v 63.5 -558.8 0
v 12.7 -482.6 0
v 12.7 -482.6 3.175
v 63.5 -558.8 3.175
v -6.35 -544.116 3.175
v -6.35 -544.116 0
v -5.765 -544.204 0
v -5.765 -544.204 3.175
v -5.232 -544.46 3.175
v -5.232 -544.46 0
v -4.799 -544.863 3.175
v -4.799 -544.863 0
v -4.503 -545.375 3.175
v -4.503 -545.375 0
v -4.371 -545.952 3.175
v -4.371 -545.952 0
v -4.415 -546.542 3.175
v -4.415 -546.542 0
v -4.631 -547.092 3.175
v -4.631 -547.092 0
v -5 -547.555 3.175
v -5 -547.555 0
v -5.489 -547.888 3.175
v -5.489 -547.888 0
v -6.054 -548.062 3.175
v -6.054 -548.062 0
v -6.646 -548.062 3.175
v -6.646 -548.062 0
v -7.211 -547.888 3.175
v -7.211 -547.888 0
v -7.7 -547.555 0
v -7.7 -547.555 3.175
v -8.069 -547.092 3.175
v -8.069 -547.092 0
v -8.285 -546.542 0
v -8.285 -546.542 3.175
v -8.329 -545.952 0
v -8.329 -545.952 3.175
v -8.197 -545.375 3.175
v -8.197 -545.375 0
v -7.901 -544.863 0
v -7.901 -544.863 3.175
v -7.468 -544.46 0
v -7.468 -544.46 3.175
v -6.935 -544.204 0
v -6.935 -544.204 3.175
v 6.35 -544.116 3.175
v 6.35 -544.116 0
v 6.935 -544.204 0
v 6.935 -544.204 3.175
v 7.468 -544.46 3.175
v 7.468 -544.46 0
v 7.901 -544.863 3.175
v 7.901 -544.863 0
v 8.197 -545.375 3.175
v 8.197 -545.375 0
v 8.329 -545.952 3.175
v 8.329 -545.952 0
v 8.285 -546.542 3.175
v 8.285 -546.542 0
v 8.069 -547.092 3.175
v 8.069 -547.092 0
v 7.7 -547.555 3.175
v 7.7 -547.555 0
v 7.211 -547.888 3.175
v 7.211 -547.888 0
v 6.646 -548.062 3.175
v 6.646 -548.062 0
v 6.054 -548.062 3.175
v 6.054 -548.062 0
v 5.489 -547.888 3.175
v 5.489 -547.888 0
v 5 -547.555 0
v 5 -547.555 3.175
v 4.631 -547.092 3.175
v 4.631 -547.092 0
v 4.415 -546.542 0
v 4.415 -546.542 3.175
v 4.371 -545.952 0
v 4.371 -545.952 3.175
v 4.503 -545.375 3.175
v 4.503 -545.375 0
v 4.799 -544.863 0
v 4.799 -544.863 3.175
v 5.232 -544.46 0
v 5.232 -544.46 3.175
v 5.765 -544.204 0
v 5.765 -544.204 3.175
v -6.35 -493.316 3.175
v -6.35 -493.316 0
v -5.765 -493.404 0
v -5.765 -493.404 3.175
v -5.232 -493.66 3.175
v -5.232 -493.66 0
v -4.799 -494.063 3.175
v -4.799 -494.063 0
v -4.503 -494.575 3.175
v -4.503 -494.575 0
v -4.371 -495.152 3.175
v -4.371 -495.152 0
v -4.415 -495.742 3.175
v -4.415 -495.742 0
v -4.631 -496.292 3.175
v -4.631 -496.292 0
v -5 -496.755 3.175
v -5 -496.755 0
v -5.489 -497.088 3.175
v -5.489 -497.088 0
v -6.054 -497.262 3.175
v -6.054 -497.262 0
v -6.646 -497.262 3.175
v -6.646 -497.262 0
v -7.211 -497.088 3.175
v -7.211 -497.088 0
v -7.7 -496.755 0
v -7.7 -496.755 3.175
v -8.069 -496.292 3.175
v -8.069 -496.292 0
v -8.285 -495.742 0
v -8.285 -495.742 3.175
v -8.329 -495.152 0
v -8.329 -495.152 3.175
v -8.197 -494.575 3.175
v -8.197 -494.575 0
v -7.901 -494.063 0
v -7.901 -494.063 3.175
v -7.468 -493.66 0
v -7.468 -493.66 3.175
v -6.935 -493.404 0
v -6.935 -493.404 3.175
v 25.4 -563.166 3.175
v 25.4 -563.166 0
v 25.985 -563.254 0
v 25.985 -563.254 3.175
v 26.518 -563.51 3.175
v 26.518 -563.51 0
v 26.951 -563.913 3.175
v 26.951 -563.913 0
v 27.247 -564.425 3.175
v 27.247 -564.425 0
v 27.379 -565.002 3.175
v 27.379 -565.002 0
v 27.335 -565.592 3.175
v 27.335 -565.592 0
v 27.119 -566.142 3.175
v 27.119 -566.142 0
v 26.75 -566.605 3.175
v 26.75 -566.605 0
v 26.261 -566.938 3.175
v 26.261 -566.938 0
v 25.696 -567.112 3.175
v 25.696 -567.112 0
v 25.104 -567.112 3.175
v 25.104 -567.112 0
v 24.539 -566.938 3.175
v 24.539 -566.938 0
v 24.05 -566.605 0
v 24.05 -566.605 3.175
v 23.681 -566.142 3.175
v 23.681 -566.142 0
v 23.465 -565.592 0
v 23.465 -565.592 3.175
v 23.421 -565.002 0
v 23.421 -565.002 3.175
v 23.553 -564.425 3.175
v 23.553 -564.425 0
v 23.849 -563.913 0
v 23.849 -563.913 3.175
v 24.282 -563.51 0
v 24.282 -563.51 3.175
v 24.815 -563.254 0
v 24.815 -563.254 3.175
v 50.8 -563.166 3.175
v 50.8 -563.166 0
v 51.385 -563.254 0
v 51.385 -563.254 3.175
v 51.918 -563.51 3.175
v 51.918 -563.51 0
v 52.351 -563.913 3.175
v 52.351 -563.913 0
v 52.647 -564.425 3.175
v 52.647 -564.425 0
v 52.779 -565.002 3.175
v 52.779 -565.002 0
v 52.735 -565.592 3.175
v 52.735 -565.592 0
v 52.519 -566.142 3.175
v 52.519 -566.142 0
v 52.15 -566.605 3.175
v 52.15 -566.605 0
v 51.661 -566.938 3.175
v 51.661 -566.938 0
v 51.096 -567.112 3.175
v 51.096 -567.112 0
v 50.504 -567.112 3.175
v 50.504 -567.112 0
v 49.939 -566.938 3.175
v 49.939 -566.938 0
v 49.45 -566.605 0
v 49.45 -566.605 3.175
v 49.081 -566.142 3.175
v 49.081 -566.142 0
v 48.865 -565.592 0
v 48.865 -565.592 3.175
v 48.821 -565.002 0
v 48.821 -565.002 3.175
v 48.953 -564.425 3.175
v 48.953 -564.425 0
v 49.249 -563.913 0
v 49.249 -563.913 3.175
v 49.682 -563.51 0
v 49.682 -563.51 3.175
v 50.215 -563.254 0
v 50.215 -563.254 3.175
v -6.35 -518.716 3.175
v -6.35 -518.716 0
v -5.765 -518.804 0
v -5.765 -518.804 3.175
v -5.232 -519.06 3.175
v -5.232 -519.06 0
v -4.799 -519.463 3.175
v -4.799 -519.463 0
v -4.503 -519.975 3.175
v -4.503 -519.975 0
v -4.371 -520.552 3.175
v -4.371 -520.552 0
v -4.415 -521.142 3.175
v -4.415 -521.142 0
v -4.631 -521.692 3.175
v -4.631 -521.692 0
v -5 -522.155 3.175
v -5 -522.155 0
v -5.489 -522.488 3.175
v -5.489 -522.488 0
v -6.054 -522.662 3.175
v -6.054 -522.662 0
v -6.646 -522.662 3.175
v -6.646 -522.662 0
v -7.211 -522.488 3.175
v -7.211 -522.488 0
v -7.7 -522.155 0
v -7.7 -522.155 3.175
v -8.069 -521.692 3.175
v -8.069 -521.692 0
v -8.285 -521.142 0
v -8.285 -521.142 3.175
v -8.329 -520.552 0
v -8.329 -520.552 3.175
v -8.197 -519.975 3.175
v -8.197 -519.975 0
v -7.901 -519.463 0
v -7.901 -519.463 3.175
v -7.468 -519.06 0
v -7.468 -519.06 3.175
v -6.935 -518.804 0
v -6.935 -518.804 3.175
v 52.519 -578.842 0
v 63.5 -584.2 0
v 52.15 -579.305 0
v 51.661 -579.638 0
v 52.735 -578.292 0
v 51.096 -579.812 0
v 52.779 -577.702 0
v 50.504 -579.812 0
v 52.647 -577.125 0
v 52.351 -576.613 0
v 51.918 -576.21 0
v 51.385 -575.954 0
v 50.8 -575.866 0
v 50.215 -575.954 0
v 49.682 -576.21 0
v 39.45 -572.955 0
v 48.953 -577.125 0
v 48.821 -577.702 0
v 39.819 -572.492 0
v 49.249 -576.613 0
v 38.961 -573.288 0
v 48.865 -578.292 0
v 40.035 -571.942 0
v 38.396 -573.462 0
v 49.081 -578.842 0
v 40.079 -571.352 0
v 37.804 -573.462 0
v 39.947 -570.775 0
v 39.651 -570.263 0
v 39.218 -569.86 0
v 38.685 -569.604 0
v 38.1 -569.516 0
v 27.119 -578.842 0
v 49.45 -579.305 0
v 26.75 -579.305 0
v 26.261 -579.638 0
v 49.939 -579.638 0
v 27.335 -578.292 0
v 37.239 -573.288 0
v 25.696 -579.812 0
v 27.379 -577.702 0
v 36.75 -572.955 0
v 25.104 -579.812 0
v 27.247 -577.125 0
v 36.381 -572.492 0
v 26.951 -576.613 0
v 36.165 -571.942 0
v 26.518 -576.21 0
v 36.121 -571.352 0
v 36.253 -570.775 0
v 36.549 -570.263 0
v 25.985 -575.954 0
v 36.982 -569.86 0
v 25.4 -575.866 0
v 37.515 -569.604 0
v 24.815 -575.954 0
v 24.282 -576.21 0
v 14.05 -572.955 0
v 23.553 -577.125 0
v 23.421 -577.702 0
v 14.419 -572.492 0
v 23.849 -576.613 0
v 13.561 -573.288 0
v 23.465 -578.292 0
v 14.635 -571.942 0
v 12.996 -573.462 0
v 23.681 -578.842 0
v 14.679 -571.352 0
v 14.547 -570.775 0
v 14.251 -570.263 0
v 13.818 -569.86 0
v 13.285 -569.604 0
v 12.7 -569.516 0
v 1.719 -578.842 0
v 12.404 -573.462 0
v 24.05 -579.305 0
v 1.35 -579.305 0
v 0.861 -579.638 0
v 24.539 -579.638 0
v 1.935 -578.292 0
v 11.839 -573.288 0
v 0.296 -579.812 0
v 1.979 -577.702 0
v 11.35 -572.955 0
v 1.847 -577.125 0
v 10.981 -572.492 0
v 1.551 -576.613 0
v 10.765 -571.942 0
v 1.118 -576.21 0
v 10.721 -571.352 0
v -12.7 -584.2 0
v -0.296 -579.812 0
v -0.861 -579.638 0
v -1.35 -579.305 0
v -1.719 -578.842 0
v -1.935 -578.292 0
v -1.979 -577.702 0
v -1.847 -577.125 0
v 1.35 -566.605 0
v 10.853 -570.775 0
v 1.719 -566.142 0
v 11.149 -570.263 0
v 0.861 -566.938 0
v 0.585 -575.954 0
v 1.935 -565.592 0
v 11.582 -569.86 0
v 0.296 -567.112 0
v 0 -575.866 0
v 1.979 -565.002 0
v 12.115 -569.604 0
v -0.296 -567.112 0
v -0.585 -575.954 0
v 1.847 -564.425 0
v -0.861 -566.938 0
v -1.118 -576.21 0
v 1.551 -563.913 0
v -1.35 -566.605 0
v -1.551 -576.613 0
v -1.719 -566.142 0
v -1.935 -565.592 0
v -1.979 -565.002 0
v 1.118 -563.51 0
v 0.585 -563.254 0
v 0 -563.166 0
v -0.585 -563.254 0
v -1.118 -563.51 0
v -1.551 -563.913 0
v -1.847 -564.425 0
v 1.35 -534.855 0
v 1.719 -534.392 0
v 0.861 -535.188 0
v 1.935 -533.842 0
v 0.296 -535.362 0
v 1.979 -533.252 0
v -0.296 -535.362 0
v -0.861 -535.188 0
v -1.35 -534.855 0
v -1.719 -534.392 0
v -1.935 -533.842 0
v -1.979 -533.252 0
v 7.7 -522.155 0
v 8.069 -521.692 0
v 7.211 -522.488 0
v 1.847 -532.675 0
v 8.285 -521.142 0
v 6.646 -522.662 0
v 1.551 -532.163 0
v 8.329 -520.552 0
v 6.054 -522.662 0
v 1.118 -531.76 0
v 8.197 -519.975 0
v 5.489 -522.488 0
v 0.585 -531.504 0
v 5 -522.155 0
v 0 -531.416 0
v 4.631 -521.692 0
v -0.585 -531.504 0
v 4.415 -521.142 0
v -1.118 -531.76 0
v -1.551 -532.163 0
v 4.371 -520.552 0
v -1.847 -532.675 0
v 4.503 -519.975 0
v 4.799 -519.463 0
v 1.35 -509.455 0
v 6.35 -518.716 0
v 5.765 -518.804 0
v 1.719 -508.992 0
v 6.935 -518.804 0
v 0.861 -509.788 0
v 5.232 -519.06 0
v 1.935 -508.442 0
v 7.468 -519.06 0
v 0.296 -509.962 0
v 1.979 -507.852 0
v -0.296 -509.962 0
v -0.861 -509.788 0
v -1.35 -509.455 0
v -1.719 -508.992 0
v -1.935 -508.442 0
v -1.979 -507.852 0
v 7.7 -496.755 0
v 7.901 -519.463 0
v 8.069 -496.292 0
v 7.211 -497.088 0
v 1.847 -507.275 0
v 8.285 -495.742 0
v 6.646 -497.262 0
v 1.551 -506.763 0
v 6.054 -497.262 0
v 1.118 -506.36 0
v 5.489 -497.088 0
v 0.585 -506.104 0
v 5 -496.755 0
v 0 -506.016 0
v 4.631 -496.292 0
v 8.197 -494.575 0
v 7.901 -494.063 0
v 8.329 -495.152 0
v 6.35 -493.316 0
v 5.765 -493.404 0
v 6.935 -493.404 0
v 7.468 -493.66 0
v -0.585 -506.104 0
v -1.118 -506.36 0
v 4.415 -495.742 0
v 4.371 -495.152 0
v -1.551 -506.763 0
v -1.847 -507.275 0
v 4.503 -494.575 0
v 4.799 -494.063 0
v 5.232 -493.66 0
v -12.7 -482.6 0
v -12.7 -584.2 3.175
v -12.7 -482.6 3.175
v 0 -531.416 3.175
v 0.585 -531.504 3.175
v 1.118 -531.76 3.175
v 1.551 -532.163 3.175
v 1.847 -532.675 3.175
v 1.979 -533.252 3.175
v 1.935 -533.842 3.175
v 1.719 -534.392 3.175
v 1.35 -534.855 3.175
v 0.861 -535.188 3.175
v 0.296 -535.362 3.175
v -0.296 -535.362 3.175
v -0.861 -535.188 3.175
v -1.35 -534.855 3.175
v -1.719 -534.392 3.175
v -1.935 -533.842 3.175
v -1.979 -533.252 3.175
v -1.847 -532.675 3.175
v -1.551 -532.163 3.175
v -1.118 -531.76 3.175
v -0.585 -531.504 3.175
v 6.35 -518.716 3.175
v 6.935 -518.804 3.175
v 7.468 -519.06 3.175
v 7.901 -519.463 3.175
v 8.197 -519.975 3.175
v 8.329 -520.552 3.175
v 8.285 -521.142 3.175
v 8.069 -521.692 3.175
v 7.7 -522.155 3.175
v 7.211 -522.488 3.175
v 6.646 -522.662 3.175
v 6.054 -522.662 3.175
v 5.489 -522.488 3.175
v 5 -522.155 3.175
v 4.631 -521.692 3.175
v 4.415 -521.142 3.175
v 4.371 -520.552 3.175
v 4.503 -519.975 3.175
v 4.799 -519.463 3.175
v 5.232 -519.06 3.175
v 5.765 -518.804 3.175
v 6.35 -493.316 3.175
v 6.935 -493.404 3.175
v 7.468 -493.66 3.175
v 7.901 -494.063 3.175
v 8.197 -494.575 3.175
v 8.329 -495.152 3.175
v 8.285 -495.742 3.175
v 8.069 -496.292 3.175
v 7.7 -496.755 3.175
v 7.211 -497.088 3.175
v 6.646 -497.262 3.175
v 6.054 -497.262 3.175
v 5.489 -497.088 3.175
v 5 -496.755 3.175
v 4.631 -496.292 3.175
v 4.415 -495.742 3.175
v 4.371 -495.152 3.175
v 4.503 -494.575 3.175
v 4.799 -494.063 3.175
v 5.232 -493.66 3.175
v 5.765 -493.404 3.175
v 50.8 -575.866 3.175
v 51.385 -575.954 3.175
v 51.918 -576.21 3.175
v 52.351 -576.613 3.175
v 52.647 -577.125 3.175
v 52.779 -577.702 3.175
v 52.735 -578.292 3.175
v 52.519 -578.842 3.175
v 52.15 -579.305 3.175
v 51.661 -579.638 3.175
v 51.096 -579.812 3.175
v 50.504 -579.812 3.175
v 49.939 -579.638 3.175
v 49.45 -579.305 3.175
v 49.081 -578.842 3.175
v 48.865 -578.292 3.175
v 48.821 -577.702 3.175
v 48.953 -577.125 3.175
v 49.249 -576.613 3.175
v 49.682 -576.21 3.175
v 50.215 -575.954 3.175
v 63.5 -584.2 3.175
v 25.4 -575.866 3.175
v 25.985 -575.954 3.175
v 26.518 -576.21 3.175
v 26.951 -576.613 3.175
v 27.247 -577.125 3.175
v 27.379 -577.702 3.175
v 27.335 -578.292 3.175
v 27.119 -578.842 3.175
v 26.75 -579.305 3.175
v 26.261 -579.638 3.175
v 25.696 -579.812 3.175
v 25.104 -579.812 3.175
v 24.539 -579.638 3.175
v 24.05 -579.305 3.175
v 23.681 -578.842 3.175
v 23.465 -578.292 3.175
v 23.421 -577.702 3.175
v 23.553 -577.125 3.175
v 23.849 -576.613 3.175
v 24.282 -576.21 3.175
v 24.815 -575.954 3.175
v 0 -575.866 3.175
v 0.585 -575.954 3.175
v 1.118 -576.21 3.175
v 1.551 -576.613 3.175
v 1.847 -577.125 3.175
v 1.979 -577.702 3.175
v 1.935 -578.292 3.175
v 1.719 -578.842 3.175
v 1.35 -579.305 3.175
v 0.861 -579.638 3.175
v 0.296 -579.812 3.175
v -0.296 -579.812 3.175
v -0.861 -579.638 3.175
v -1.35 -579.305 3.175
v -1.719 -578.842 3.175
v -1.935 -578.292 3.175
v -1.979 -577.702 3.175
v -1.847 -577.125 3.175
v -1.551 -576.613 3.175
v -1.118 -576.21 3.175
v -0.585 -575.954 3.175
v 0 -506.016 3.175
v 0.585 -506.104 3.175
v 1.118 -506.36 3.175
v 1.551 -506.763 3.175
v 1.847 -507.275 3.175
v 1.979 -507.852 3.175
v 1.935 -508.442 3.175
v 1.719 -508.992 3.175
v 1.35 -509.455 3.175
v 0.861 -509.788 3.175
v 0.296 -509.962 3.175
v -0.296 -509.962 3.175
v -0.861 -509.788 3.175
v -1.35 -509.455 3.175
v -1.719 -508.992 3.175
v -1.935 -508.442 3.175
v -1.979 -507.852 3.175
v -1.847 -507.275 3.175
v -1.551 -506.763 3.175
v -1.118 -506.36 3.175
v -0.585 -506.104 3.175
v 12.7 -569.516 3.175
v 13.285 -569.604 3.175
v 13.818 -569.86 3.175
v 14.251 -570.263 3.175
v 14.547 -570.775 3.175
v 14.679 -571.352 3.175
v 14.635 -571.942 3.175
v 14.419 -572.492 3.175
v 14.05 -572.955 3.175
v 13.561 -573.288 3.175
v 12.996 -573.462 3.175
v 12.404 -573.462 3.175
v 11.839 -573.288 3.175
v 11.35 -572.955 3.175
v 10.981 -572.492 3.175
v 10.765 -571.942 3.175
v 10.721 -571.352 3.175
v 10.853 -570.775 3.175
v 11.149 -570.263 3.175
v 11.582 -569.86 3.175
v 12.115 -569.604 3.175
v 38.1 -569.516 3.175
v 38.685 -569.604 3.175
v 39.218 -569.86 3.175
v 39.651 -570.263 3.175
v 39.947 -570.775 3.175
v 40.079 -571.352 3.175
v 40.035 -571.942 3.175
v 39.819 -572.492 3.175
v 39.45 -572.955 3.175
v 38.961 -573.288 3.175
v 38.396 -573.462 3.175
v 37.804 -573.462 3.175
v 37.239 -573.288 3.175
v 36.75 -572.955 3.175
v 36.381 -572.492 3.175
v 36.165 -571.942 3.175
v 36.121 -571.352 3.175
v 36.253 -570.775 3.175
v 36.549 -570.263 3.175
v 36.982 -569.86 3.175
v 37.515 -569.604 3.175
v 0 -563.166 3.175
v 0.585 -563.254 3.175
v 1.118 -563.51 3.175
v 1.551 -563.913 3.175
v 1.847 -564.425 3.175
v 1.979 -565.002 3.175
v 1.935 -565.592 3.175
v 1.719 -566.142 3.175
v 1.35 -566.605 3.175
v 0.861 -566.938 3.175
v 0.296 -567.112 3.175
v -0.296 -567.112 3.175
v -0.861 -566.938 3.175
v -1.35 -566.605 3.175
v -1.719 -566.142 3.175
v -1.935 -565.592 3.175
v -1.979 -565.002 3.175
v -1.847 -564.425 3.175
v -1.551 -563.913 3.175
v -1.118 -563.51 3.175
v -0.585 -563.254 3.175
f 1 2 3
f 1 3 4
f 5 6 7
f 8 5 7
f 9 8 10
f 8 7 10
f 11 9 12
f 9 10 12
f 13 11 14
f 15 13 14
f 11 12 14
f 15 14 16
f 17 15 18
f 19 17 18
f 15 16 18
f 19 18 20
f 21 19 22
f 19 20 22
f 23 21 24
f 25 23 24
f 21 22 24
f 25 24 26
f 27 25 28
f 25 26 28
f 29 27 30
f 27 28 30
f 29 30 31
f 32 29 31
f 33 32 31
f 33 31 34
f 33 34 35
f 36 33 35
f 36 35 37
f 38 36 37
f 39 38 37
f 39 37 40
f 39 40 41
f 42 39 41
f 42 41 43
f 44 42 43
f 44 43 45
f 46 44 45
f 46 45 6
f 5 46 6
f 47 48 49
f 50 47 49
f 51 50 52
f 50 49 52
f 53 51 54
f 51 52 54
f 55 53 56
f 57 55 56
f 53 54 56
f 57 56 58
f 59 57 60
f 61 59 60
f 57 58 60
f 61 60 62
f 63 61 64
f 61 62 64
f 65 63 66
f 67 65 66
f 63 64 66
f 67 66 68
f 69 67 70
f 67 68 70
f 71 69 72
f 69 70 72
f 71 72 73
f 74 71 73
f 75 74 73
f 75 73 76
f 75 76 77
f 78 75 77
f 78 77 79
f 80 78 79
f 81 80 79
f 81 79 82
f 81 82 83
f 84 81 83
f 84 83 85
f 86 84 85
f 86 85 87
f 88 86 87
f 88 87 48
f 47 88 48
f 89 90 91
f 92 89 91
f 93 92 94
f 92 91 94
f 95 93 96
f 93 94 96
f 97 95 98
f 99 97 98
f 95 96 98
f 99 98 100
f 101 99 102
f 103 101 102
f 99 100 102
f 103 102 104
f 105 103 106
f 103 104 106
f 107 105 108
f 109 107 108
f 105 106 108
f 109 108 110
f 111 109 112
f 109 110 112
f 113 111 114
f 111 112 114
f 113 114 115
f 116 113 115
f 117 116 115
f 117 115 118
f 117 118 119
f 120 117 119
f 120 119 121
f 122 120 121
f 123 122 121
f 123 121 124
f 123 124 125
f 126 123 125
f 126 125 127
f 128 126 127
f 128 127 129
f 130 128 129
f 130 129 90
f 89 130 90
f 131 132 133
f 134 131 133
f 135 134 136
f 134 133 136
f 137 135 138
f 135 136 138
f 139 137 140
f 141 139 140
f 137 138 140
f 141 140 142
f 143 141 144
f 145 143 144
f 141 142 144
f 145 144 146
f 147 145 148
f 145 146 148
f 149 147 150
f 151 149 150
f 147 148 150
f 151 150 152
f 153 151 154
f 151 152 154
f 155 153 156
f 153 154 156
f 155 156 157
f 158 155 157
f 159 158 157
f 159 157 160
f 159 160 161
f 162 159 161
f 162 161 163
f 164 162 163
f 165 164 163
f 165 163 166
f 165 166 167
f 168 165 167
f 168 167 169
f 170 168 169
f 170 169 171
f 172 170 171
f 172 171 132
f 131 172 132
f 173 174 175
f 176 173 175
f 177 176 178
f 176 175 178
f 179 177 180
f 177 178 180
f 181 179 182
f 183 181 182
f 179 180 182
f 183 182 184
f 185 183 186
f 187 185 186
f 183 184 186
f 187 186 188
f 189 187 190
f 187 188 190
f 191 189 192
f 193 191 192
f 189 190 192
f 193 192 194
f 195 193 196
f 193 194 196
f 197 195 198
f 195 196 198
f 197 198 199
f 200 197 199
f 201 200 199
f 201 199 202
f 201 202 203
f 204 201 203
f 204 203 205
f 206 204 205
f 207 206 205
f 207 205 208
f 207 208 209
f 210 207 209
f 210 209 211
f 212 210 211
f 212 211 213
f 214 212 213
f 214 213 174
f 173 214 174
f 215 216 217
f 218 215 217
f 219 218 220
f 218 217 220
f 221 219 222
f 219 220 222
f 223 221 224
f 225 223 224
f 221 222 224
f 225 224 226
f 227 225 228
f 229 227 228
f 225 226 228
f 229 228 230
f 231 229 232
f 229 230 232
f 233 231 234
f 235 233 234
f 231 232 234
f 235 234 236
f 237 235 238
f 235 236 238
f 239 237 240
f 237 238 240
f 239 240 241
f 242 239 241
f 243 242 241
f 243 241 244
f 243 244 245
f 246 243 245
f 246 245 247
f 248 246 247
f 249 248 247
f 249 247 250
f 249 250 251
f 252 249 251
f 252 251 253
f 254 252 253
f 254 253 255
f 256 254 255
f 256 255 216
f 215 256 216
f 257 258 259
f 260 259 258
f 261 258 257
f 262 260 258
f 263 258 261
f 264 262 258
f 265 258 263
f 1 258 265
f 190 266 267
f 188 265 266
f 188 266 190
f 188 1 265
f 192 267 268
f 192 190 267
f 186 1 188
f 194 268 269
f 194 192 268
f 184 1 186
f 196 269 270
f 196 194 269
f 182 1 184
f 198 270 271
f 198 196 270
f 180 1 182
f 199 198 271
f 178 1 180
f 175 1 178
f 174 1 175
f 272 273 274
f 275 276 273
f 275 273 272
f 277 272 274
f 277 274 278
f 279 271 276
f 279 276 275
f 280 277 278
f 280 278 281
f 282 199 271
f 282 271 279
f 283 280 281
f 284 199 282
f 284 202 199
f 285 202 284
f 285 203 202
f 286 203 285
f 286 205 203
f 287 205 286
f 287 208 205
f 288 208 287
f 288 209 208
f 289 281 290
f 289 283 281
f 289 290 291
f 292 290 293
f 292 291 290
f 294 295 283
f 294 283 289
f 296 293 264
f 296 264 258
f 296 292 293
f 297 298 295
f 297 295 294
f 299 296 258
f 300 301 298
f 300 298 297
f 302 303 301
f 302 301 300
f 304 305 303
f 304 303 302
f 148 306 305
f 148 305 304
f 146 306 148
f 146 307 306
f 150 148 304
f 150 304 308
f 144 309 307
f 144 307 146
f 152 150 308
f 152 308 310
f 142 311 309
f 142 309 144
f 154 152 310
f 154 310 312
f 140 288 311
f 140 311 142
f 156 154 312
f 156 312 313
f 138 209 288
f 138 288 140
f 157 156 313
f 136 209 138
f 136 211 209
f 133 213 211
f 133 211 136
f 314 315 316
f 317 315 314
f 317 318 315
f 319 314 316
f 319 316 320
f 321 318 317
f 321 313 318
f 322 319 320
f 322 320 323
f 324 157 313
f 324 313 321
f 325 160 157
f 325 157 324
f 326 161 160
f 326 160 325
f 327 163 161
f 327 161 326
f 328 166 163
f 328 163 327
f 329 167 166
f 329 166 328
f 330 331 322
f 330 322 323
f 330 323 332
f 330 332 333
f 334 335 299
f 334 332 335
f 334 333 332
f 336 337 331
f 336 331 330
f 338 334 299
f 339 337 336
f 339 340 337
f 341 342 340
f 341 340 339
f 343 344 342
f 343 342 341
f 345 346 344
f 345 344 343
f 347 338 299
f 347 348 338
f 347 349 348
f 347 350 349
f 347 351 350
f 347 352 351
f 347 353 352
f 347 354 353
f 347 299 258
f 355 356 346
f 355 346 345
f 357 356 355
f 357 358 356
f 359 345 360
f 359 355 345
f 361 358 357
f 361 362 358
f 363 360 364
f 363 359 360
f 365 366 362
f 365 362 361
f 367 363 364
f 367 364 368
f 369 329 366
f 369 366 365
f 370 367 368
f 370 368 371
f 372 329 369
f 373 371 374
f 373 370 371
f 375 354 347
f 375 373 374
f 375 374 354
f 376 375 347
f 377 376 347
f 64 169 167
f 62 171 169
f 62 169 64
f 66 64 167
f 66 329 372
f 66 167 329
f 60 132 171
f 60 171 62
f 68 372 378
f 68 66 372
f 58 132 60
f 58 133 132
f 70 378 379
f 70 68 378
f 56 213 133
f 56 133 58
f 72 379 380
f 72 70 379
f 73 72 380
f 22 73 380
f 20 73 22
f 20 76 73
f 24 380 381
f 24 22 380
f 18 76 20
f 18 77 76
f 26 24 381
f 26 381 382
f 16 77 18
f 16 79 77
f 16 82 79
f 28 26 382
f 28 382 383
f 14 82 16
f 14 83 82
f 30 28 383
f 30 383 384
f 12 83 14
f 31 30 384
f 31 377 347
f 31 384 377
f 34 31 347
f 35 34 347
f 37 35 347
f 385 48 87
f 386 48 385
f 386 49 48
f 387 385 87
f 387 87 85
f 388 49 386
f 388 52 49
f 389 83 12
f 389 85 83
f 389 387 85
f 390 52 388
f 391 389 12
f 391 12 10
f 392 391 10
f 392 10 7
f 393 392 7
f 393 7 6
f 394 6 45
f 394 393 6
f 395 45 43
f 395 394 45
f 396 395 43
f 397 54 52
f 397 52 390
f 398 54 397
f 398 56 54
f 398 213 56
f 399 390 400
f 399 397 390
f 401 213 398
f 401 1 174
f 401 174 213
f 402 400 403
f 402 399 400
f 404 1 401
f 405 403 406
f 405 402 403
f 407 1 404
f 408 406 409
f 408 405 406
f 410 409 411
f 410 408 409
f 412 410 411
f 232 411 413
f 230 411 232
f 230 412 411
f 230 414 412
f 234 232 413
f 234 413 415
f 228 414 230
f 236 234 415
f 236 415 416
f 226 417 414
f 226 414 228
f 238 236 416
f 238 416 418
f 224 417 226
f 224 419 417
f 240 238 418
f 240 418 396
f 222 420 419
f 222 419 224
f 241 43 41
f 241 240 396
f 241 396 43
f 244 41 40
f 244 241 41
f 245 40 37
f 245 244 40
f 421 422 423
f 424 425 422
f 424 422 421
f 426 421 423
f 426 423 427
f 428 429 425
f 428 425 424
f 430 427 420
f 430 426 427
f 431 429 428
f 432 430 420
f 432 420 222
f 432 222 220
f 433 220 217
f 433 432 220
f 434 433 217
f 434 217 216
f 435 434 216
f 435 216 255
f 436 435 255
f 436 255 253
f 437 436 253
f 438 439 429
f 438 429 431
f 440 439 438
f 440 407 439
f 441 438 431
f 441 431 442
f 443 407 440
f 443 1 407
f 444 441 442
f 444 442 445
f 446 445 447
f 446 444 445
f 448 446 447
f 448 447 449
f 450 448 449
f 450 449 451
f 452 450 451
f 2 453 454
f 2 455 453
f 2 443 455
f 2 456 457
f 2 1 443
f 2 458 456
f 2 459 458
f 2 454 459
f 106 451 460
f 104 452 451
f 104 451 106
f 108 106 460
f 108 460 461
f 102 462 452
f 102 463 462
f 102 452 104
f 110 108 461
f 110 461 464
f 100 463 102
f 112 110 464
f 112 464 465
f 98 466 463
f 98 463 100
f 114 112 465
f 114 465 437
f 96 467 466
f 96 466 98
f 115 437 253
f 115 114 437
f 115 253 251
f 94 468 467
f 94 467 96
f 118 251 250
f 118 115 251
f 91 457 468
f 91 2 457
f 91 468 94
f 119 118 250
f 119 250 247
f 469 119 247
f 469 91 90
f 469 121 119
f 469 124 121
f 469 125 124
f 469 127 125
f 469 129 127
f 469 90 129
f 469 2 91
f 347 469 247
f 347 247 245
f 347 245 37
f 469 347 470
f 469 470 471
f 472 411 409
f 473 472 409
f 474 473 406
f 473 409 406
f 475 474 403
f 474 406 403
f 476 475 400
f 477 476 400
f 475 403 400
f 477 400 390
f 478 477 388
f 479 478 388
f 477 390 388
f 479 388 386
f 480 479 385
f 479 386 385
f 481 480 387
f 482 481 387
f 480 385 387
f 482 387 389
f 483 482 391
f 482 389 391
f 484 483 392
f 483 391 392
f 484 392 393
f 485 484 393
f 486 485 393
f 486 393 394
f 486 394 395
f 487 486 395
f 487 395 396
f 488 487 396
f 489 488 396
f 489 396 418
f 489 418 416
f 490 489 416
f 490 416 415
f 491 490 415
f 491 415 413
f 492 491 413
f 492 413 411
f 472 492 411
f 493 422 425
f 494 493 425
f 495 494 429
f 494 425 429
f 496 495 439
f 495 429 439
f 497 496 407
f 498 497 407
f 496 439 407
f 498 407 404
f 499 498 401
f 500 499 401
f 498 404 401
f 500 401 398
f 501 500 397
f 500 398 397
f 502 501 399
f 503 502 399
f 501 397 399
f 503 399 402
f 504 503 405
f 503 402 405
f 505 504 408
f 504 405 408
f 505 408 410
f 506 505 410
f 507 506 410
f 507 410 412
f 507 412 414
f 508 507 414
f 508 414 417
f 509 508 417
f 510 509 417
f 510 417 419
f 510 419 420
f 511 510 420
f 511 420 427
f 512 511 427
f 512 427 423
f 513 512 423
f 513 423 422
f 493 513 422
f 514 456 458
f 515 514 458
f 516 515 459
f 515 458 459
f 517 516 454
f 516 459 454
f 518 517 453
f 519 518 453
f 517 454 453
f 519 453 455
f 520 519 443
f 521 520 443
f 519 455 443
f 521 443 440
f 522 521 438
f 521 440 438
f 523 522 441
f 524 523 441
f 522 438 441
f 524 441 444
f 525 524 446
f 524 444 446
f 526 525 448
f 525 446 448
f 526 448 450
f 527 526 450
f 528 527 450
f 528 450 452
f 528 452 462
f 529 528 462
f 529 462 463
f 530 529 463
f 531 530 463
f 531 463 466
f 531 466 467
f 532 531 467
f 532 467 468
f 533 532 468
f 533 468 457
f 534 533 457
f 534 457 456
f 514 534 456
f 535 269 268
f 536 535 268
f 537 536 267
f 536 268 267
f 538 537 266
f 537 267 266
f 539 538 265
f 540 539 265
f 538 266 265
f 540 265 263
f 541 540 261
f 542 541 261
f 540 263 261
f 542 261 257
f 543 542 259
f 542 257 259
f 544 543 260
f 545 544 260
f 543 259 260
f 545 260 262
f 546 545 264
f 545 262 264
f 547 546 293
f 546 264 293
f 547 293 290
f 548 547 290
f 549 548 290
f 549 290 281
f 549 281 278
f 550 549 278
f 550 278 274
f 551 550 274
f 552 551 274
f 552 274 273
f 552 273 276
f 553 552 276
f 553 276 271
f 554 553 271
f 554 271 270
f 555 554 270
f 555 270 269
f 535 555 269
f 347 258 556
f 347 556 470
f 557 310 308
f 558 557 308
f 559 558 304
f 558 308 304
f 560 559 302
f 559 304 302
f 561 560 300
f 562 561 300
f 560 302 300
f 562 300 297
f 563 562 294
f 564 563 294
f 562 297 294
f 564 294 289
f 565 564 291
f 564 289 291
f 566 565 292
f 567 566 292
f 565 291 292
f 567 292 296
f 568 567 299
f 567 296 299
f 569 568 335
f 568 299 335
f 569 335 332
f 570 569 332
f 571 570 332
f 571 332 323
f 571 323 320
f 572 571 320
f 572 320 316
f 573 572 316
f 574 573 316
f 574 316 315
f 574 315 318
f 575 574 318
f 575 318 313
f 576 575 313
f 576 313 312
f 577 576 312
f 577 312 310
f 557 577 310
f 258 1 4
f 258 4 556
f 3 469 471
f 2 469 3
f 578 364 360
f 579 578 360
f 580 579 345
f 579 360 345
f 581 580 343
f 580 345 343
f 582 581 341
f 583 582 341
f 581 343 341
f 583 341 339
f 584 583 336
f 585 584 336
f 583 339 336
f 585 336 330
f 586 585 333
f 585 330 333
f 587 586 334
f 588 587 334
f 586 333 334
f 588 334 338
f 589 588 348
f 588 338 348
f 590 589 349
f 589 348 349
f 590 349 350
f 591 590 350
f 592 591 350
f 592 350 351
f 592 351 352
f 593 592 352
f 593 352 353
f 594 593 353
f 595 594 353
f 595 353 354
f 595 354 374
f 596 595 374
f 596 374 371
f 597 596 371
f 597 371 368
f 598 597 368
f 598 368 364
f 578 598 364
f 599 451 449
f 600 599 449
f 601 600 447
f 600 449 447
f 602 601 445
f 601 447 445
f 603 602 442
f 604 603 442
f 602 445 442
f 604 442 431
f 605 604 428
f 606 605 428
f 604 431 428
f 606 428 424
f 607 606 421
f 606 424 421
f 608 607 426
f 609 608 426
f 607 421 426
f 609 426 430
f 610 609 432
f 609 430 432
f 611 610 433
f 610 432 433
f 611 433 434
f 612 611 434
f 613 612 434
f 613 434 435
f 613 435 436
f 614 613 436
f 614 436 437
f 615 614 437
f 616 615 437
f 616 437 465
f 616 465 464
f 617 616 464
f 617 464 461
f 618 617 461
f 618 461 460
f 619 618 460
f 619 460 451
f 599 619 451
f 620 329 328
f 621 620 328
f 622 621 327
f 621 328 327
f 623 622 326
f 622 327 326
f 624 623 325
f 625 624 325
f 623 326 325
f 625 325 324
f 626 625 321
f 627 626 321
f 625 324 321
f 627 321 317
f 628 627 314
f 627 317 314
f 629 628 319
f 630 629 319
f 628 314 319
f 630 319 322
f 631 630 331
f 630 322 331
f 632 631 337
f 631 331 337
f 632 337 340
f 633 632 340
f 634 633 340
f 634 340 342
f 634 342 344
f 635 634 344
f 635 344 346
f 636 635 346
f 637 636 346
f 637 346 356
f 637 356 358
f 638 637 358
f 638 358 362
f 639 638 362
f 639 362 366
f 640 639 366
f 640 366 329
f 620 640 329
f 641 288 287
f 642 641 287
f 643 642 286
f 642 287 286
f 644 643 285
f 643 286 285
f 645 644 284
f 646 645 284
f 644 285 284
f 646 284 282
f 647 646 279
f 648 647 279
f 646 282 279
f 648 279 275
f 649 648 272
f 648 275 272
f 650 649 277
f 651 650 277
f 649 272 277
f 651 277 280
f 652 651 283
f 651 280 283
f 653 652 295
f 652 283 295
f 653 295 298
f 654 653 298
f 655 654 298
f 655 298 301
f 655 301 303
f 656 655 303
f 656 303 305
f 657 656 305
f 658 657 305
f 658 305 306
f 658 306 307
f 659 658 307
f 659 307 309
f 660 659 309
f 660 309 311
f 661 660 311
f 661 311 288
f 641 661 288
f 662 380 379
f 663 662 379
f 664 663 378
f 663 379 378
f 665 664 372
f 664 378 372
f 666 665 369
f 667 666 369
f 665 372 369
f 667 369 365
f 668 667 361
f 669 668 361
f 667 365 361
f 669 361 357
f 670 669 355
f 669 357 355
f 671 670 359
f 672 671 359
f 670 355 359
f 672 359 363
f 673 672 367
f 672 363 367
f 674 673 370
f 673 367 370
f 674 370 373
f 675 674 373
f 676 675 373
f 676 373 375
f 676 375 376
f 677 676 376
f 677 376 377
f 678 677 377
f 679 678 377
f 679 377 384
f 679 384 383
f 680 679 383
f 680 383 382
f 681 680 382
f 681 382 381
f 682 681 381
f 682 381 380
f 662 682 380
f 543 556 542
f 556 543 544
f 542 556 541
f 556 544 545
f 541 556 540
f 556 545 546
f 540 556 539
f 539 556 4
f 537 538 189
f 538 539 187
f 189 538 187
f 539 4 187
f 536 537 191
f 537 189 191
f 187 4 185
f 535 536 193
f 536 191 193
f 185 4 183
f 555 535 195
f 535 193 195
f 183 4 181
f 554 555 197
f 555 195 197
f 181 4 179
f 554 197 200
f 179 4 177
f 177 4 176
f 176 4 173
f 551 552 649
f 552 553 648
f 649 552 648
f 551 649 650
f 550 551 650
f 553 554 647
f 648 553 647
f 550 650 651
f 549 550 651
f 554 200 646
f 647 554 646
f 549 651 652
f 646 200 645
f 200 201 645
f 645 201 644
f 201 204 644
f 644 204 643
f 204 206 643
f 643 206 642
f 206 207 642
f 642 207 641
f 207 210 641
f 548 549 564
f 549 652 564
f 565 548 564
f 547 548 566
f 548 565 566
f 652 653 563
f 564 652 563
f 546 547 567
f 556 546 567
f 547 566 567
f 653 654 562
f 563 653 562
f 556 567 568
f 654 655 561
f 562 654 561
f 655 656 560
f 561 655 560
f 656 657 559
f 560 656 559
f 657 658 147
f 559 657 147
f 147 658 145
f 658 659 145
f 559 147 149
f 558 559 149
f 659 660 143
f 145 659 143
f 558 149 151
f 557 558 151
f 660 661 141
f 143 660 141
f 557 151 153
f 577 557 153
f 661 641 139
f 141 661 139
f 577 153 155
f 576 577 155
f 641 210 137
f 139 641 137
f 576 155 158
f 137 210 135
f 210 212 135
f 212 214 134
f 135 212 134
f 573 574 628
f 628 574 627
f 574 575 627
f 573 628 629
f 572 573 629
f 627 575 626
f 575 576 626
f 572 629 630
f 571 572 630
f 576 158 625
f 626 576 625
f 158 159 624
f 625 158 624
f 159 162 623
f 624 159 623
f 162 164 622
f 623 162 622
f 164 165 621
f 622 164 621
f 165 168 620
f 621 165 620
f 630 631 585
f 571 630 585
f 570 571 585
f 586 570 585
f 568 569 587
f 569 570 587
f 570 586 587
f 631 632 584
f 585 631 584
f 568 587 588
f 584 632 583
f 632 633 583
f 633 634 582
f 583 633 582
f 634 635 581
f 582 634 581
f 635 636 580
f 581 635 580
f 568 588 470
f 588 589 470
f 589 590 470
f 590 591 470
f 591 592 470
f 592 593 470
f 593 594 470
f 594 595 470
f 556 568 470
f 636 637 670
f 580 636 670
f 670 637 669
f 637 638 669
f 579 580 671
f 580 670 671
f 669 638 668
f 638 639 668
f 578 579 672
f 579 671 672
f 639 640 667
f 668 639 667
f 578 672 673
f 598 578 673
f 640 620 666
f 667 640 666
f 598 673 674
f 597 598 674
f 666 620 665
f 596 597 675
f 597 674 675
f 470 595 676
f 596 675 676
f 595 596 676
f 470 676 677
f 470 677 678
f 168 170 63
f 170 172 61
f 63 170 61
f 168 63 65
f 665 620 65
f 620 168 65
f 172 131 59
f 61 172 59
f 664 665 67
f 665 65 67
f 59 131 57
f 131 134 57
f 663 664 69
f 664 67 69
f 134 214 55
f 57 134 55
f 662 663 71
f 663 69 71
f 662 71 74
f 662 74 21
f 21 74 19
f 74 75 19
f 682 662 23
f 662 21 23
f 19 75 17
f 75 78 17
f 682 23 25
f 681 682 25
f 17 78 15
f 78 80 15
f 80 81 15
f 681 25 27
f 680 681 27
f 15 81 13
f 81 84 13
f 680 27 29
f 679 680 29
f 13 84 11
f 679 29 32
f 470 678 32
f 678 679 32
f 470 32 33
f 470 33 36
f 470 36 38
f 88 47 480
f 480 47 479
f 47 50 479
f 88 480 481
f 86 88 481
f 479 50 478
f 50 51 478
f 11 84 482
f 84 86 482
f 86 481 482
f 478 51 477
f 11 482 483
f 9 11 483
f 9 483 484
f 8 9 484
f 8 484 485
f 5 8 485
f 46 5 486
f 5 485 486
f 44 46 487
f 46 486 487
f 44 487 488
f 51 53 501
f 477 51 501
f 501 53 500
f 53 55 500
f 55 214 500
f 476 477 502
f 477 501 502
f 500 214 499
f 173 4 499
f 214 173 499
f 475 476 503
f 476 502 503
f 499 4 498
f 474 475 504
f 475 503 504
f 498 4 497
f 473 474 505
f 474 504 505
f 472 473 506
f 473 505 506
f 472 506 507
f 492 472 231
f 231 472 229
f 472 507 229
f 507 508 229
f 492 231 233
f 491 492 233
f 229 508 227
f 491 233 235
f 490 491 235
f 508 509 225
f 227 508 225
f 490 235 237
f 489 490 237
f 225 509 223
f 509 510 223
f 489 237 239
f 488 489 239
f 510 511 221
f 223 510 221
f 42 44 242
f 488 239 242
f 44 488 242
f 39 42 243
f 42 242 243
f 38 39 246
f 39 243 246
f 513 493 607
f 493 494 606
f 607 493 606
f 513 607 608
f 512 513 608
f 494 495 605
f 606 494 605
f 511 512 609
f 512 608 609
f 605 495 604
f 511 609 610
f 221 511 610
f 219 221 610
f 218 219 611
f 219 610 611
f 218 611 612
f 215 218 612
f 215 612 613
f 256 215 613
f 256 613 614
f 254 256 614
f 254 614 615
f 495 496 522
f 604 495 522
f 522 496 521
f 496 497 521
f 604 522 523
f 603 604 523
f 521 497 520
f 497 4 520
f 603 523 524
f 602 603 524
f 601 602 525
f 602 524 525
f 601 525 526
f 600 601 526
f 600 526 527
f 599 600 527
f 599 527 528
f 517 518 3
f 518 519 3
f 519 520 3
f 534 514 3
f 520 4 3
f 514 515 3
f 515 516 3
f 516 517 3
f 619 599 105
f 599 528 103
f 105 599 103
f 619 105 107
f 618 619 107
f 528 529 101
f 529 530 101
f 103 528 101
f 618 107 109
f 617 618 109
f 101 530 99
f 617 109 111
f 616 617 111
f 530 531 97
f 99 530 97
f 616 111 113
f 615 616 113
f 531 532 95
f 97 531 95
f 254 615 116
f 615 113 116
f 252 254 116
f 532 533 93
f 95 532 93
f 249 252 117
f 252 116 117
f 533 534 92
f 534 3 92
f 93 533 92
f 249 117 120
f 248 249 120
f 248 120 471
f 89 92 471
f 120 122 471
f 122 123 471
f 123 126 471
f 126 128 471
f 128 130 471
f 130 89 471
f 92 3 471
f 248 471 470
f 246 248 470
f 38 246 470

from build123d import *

# Parameters (mm, degrees)
BOSS_EXTRUDE1_DEPTH              = 3.175
F_97_0_0059_DIAMETER_HOLE1_D     = 3.96875
F_97_0_0059_DIAMETER_HOLE1_DEPTH = 6.349
F_97_0_0059_DIAMETER_HOLE1_TIP   = 1.192332791


with BuildPart() as part:
    # Sketch1 (on Front Plane) → Boss-Extrude1 (new body)
    with BuildSketch(Plane.XY):
        Polygon((-12.7, -584.2), (-12.7, -482.6), (12.7, -482.6), (63.5, -558.8), (63.5, -584.2), align=None)
    extrude(amount=BOSS_EXTRUDE1_DEPTH)

    # #97 (0.0059) Diameter Hole1
    with Locations(Plane(origin=(-12.7, -584.2, 3.175), x_dir=(0, -1, 0), z_dir=(0, 0, 1))):
        with Locations((-88.9, 6.35), (-88.9, 19.05), (-76.2, 12.7), (-63.5, 6.35), (-63.5, 19.05), (-50.8, 12.7), (-38.1, 6.35), (-38.1, 19.05), (-6.35, 12.7), (-19.05, 12.7), (-12.7, 25.4), (-19.05, 38.1), (-6.35, 38.1), (-12.7, 50.8), (-19.05, 63.5), (-6.35, 63.5)):
            Hole(F_97_0_0059_DIAMETER_HOLE1_D / 2, depth=F_97_0_0059_DIAMETER_HOLE1_DEPTH)
            with Locations((0, 0, -(F_97_0_0059_DIAMETER_HOLE1_DEPTH + F_97_0_0059_DIAMETER_HOLE1_TIP / 2))):  # 118° drill point
                Cone(0, F_97_0_0059_DIAMETER_HOLE1_D / 2, F_97_0_0059_DIAMETER_HOLE1_TIP, mode=Mode.SUBTRACT)


solid = part.part
